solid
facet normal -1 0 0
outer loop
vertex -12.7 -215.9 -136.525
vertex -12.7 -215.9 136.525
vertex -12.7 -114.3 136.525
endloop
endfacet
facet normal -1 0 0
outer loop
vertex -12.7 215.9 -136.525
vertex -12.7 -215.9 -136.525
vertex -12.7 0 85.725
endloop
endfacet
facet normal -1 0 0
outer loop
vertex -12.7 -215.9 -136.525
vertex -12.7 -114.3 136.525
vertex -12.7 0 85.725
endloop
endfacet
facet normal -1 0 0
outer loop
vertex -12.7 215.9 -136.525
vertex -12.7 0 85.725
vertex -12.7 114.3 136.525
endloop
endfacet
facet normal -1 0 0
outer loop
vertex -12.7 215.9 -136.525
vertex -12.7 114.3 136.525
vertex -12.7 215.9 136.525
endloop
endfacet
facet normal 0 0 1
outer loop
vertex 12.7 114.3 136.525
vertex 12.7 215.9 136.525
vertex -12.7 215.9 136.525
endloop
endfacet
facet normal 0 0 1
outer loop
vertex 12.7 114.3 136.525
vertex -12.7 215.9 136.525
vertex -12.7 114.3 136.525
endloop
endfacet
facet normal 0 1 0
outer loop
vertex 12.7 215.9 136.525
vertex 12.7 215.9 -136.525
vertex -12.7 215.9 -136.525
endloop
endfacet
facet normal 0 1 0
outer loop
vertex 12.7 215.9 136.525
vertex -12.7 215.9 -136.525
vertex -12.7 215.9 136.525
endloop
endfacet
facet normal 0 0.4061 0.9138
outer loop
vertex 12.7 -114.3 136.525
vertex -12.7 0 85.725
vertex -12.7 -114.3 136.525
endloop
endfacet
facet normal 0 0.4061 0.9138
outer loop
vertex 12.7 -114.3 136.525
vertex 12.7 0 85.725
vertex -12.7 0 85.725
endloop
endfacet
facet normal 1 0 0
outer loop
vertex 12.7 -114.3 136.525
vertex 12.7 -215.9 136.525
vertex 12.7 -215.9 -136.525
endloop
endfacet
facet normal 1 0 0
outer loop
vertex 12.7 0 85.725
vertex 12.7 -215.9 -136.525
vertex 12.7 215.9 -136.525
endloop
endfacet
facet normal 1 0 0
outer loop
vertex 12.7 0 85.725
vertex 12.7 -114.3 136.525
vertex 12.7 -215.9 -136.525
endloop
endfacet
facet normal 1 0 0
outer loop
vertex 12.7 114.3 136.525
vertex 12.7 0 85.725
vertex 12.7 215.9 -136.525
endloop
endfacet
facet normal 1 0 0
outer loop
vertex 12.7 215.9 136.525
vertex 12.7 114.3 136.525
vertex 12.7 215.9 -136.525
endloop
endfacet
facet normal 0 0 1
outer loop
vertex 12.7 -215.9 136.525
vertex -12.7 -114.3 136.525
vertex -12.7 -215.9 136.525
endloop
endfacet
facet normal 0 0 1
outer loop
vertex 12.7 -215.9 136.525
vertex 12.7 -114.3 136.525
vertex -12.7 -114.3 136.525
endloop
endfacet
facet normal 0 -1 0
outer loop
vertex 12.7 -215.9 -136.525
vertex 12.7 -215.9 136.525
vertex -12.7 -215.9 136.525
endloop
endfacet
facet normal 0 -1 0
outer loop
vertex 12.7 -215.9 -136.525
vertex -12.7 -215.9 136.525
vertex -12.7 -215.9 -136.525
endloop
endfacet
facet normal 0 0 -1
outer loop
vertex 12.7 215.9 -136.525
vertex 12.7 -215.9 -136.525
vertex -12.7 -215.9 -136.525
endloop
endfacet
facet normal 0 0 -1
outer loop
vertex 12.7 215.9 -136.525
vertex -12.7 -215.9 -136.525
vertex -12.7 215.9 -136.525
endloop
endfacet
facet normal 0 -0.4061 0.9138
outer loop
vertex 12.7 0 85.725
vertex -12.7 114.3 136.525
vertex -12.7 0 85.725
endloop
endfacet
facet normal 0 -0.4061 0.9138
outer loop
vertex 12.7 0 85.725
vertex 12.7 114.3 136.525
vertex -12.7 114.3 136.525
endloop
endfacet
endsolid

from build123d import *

# Parameters (mm, degrees)
F1_DEPTH = 12.7


with BuildPart() as f1:
    # F0 (on Right) → F1 (new body, symmetric)
    with BuildSketch(Plane.YZ):
        Polygon((-114.3, 136.525), (-215.9, 136.525), (-215.9, -136.525), (215.9, -136.525), (215.9, 136.525), (114.3, 136.525), (0, 85.725), align=None)
    extrude(amount=F1_DEPTH, both=True)


solid = f1.part
